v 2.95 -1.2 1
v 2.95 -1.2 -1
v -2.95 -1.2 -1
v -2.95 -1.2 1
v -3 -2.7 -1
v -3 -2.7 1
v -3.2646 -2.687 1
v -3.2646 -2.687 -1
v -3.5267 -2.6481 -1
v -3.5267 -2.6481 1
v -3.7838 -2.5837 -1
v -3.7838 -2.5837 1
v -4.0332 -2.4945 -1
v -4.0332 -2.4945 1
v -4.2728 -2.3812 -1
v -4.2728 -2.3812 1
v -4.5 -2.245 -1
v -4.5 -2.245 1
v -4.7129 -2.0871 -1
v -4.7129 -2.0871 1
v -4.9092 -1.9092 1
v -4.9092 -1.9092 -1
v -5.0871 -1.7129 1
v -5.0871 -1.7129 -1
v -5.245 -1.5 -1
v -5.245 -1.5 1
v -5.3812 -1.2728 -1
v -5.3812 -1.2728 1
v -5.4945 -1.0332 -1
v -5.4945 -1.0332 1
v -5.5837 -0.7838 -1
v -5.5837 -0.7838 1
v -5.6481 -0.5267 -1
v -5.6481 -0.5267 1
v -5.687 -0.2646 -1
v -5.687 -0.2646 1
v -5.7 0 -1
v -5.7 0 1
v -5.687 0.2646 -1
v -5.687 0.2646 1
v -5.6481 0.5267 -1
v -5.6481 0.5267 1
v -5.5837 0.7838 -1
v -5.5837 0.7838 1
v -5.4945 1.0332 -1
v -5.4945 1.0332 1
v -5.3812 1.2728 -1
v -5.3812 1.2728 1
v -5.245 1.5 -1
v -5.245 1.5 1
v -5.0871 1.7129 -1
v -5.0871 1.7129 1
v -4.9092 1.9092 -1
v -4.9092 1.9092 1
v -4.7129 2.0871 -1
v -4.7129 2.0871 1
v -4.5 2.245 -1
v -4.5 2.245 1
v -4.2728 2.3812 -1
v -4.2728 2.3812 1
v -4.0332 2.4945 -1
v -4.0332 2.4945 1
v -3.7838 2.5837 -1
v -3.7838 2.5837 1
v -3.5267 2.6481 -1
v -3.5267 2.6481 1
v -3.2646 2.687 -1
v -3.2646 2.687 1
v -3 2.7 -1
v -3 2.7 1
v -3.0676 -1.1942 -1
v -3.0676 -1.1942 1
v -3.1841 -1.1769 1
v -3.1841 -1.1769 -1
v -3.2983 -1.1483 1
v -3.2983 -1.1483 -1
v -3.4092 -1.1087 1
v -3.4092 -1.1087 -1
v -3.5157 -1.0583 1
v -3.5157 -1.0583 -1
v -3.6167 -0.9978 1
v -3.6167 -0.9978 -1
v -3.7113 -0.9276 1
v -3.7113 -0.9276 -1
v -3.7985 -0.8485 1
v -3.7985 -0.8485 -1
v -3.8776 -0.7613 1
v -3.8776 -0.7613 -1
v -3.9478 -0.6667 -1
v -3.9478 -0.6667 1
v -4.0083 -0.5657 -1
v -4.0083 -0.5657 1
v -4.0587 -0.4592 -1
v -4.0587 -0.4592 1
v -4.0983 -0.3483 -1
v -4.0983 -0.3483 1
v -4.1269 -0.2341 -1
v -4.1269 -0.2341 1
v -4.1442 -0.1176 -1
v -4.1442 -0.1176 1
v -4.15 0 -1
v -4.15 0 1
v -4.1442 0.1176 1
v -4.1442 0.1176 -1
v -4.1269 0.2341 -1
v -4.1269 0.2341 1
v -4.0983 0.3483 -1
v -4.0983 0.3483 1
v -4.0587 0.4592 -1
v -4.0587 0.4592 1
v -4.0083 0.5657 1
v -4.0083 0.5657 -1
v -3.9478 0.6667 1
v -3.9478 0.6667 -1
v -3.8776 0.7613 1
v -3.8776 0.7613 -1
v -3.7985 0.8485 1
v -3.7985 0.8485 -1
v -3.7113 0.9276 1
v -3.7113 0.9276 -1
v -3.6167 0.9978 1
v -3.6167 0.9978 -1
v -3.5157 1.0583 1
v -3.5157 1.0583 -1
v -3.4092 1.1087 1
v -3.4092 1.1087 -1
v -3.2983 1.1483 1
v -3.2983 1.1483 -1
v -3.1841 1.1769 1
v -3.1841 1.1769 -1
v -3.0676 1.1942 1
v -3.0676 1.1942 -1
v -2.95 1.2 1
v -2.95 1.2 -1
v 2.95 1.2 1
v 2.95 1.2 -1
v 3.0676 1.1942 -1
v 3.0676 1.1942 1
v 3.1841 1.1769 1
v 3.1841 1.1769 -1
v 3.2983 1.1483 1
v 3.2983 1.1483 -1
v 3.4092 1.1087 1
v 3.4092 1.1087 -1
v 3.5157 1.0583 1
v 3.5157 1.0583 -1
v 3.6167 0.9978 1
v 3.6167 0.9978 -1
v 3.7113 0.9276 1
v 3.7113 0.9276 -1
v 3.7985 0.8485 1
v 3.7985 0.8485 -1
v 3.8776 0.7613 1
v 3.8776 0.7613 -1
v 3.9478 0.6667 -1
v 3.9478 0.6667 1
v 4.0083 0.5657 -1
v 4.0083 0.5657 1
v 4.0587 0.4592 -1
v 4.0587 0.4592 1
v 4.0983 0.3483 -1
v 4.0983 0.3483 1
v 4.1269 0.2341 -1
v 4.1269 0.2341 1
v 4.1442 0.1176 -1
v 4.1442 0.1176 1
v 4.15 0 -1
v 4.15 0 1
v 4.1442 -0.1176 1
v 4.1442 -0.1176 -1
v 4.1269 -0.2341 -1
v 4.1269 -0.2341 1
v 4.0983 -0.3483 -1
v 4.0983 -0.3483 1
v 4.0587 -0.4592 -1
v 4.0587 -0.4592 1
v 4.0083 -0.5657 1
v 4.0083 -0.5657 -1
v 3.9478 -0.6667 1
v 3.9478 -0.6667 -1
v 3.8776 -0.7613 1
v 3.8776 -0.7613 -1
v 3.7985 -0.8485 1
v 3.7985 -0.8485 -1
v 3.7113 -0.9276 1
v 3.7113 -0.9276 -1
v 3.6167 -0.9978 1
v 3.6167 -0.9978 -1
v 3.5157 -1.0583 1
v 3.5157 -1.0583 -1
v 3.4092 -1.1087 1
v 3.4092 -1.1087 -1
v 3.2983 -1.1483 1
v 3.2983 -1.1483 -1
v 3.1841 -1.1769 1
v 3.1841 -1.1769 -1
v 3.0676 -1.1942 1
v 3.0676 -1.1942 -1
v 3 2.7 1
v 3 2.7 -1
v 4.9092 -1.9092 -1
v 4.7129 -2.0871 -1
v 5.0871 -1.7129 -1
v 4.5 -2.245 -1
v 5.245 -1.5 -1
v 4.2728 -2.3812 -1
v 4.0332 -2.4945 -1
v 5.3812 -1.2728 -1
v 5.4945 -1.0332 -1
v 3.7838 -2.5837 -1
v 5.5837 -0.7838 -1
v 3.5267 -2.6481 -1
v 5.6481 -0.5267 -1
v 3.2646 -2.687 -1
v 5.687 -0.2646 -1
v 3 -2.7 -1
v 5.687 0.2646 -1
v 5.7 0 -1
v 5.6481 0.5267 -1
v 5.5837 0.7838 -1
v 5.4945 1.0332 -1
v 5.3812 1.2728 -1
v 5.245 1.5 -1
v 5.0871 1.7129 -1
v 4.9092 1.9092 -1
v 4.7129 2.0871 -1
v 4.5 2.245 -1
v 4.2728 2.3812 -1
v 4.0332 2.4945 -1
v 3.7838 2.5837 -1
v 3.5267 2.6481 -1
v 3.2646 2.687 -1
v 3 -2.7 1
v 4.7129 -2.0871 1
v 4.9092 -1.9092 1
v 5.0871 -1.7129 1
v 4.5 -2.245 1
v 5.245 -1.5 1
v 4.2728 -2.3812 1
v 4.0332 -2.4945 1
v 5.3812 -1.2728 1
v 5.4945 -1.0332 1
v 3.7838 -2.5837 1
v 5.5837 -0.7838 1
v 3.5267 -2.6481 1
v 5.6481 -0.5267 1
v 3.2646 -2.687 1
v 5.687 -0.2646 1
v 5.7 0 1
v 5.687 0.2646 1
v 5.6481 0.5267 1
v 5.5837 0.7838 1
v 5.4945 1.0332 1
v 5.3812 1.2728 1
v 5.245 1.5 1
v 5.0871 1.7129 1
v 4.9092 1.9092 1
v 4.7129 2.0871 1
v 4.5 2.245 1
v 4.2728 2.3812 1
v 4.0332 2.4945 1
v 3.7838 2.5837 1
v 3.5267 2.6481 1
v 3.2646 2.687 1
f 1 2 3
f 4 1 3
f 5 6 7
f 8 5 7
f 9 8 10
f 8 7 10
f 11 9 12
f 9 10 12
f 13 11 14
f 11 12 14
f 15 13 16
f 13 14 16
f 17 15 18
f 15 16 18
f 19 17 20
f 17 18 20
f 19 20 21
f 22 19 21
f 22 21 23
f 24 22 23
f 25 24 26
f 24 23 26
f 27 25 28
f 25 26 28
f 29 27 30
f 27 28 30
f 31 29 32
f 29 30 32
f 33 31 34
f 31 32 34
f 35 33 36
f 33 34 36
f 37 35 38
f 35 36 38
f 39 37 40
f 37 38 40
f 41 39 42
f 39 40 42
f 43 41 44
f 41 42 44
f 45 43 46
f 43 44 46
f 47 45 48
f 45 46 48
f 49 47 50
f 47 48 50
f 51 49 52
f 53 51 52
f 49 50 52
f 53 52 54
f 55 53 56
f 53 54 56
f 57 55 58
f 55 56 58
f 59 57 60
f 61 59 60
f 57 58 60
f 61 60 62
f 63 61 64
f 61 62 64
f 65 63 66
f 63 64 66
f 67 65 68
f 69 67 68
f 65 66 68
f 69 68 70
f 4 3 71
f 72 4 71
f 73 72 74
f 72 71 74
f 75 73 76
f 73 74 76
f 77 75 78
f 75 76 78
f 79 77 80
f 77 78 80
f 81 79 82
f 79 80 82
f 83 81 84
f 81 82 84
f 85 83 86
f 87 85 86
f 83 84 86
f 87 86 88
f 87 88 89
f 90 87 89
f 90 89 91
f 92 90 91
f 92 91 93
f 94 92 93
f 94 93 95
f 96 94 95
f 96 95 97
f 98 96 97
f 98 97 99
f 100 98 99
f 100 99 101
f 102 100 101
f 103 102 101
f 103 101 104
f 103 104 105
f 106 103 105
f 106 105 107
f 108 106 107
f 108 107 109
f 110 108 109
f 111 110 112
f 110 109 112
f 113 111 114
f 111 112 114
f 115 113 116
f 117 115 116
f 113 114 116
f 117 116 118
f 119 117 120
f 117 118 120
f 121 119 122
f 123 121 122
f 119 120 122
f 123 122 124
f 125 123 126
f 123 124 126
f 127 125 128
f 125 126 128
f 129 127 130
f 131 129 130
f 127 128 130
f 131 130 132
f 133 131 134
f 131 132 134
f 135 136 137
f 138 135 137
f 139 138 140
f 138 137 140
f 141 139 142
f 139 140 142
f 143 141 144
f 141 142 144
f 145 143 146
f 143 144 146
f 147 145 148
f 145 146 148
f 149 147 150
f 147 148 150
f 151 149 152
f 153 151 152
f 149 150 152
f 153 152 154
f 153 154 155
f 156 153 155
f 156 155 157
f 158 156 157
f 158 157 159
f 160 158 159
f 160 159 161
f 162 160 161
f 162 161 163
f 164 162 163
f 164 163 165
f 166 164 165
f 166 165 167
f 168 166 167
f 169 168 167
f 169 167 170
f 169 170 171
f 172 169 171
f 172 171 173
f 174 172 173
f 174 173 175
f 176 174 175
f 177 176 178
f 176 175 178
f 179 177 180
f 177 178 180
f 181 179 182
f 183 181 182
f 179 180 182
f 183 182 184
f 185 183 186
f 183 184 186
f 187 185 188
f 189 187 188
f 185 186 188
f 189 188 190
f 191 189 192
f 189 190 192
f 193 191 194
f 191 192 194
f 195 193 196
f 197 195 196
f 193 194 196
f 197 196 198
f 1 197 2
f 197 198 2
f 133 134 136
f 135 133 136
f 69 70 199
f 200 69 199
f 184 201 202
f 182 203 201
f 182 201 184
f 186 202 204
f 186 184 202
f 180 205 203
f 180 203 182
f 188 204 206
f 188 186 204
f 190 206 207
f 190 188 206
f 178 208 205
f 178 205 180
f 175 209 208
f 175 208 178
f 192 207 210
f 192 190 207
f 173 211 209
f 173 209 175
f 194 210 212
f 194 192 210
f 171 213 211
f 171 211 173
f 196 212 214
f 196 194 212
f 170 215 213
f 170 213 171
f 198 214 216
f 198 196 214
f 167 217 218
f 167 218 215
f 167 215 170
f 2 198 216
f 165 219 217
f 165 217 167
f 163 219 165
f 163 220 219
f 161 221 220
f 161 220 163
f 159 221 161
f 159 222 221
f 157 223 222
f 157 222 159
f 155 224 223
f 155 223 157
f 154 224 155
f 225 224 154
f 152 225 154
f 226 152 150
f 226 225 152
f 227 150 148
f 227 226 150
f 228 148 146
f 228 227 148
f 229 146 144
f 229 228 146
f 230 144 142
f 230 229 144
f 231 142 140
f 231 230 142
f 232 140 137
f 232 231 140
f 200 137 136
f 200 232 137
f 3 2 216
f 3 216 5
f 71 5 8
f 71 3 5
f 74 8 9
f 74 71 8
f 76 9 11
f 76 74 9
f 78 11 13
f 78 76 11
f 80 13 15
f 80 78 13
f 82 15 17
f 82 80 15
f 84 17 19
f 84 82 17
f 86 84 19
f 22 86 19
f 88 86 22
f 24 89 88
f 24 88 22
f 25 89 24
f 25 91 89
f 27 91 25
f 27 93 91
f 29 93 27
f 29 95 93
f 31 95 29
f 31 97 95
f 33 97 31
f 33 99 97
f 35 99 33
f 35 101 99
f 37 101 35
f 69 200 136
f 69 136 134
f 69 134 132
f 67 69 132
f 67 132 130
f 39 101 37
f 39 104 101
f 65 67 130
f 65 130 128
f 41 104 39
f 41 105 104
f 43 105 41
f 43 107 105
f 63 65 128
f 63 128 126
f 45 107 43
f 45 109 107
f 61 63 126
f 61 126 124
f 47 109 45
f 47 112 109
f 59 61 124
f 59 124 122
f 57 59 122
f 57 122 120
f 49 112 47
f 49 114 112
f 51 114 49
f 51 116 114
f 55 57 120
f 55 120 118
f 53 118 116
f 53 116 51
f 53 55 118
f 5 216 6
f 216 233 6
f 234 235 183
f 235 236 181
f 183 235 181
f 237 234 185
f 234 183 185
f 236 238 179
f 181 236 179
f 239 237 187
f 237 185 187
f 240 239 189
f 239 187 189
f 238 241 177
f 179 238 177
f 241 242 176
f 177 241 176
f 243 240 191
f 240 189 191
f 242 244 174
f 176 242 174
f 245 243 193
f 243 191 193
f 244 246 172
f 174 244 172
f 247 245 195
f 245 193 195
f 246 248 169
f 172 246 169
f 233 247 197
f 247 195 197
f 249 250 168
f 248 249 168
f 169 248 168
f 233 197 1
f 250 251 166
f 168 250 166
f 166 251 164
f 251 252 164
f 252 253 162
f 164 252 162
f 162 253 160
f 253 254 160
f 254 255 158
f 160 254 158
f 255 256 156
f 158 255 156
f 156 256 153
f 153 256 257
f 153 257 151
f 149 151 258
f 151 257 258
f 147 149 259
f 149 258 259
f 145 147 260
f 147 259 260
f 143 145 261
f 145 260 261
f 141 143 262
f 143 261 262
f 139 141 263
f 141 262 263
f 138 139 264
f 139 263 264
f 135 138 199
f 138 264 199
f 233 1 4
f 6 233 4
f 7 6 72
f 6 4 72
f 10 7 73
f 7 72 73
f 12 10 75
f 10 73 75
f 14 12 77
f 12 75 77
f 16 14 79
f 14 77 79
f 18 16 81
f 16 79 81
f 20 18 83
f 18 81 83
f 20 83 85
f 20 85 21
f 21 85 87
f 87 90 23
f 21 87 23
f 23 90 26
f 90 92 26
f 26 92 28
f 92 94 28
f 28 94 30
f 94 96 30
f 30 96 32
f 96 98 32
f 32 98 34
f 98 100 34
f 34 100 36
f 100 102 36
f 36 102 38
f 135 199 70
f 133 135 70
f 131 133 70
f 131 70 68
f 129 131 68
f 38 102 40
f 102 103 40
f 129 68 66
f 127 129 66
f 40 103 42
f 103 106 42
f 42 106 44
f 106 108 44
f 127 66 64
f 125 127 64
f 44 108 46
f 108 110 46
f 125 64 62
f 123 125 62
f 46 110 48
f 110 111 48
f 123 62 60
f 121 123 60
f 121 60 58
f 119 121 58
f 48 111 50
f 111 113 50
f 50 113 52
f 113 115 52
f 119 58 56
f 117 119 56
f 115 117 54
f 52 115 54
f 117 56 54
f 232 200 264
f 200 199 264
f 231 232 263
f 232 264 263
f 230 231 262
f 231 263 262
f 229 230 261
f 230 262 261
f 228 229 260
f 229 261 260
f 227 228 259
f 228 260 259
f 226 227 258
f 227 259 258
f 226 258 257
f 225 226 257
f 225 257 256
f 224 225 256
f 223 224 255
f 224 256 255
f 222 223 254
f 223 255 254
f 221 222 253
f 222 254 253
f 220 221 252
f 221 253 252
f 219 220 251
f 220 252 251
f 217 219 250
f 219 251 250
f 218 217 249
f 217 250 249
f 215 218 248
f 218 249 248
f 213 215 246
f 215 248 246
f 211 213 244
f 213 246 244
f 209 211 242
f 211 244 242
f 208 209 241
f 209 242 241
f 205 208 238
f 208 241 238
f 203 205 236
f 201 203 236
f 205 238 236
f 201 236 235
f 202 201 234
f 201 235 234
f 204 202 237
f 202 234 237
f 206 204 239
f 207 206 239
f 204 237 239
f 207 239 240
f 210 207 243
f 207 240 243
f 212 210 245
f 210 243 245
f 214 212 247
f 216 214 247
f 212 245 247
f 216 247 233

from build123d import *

# Parameters (mm, degrees)
PROFILE_DEPTH         = 1
USBCCUTOUT_DEPTH      = 7.385922016
USBCCUTOUT_DEPTH_BACK = 7.385922016


with BuildPart() as part:
    # ProfileS → Profile (new, symmetric)
    with BuildSketch(Plane.XY):
        with BuildLine():
            Line((-3, 2.7), (3, 2.7))
            ThreePointArc((3, 2.7), (5.7, 0), (3, -2.7))
            Line((3, -2.7), (-3, -2.7))
            ThreePointArc((-3, -2.7), (-5.7, 0), (-3, 2.7))
        make_face()
    extrude(amount=PROFILE_DEPTH, both=True)

    # USBCCutoutS → USBCCutout (cut, two sides: drawn at the far end of the back side and taken through both)
    with BuildSketch(Plane.XY.offset(-USBCCUTOUT_DEPTH_BACK)):
        with BuildLine():
            Line((-2.95, 1.2), (2.95, 1.2))
            ThreePointArc((2.95, 1.2), (4.15, 0), (2.95, -1.2))
            Line((2.95, -1.2), (-2.95, -1.2))
            ThreePointArc((-2.95, -1.2), (-4.15, 0), (-2.95, 1.2))
        make_face()
    extrude(amount=USBCCUTOUT_DEPTH + USBCCUTOUT_DEPTH_BACK, mode=Mode.SUBTRACT)


solid = part.part
